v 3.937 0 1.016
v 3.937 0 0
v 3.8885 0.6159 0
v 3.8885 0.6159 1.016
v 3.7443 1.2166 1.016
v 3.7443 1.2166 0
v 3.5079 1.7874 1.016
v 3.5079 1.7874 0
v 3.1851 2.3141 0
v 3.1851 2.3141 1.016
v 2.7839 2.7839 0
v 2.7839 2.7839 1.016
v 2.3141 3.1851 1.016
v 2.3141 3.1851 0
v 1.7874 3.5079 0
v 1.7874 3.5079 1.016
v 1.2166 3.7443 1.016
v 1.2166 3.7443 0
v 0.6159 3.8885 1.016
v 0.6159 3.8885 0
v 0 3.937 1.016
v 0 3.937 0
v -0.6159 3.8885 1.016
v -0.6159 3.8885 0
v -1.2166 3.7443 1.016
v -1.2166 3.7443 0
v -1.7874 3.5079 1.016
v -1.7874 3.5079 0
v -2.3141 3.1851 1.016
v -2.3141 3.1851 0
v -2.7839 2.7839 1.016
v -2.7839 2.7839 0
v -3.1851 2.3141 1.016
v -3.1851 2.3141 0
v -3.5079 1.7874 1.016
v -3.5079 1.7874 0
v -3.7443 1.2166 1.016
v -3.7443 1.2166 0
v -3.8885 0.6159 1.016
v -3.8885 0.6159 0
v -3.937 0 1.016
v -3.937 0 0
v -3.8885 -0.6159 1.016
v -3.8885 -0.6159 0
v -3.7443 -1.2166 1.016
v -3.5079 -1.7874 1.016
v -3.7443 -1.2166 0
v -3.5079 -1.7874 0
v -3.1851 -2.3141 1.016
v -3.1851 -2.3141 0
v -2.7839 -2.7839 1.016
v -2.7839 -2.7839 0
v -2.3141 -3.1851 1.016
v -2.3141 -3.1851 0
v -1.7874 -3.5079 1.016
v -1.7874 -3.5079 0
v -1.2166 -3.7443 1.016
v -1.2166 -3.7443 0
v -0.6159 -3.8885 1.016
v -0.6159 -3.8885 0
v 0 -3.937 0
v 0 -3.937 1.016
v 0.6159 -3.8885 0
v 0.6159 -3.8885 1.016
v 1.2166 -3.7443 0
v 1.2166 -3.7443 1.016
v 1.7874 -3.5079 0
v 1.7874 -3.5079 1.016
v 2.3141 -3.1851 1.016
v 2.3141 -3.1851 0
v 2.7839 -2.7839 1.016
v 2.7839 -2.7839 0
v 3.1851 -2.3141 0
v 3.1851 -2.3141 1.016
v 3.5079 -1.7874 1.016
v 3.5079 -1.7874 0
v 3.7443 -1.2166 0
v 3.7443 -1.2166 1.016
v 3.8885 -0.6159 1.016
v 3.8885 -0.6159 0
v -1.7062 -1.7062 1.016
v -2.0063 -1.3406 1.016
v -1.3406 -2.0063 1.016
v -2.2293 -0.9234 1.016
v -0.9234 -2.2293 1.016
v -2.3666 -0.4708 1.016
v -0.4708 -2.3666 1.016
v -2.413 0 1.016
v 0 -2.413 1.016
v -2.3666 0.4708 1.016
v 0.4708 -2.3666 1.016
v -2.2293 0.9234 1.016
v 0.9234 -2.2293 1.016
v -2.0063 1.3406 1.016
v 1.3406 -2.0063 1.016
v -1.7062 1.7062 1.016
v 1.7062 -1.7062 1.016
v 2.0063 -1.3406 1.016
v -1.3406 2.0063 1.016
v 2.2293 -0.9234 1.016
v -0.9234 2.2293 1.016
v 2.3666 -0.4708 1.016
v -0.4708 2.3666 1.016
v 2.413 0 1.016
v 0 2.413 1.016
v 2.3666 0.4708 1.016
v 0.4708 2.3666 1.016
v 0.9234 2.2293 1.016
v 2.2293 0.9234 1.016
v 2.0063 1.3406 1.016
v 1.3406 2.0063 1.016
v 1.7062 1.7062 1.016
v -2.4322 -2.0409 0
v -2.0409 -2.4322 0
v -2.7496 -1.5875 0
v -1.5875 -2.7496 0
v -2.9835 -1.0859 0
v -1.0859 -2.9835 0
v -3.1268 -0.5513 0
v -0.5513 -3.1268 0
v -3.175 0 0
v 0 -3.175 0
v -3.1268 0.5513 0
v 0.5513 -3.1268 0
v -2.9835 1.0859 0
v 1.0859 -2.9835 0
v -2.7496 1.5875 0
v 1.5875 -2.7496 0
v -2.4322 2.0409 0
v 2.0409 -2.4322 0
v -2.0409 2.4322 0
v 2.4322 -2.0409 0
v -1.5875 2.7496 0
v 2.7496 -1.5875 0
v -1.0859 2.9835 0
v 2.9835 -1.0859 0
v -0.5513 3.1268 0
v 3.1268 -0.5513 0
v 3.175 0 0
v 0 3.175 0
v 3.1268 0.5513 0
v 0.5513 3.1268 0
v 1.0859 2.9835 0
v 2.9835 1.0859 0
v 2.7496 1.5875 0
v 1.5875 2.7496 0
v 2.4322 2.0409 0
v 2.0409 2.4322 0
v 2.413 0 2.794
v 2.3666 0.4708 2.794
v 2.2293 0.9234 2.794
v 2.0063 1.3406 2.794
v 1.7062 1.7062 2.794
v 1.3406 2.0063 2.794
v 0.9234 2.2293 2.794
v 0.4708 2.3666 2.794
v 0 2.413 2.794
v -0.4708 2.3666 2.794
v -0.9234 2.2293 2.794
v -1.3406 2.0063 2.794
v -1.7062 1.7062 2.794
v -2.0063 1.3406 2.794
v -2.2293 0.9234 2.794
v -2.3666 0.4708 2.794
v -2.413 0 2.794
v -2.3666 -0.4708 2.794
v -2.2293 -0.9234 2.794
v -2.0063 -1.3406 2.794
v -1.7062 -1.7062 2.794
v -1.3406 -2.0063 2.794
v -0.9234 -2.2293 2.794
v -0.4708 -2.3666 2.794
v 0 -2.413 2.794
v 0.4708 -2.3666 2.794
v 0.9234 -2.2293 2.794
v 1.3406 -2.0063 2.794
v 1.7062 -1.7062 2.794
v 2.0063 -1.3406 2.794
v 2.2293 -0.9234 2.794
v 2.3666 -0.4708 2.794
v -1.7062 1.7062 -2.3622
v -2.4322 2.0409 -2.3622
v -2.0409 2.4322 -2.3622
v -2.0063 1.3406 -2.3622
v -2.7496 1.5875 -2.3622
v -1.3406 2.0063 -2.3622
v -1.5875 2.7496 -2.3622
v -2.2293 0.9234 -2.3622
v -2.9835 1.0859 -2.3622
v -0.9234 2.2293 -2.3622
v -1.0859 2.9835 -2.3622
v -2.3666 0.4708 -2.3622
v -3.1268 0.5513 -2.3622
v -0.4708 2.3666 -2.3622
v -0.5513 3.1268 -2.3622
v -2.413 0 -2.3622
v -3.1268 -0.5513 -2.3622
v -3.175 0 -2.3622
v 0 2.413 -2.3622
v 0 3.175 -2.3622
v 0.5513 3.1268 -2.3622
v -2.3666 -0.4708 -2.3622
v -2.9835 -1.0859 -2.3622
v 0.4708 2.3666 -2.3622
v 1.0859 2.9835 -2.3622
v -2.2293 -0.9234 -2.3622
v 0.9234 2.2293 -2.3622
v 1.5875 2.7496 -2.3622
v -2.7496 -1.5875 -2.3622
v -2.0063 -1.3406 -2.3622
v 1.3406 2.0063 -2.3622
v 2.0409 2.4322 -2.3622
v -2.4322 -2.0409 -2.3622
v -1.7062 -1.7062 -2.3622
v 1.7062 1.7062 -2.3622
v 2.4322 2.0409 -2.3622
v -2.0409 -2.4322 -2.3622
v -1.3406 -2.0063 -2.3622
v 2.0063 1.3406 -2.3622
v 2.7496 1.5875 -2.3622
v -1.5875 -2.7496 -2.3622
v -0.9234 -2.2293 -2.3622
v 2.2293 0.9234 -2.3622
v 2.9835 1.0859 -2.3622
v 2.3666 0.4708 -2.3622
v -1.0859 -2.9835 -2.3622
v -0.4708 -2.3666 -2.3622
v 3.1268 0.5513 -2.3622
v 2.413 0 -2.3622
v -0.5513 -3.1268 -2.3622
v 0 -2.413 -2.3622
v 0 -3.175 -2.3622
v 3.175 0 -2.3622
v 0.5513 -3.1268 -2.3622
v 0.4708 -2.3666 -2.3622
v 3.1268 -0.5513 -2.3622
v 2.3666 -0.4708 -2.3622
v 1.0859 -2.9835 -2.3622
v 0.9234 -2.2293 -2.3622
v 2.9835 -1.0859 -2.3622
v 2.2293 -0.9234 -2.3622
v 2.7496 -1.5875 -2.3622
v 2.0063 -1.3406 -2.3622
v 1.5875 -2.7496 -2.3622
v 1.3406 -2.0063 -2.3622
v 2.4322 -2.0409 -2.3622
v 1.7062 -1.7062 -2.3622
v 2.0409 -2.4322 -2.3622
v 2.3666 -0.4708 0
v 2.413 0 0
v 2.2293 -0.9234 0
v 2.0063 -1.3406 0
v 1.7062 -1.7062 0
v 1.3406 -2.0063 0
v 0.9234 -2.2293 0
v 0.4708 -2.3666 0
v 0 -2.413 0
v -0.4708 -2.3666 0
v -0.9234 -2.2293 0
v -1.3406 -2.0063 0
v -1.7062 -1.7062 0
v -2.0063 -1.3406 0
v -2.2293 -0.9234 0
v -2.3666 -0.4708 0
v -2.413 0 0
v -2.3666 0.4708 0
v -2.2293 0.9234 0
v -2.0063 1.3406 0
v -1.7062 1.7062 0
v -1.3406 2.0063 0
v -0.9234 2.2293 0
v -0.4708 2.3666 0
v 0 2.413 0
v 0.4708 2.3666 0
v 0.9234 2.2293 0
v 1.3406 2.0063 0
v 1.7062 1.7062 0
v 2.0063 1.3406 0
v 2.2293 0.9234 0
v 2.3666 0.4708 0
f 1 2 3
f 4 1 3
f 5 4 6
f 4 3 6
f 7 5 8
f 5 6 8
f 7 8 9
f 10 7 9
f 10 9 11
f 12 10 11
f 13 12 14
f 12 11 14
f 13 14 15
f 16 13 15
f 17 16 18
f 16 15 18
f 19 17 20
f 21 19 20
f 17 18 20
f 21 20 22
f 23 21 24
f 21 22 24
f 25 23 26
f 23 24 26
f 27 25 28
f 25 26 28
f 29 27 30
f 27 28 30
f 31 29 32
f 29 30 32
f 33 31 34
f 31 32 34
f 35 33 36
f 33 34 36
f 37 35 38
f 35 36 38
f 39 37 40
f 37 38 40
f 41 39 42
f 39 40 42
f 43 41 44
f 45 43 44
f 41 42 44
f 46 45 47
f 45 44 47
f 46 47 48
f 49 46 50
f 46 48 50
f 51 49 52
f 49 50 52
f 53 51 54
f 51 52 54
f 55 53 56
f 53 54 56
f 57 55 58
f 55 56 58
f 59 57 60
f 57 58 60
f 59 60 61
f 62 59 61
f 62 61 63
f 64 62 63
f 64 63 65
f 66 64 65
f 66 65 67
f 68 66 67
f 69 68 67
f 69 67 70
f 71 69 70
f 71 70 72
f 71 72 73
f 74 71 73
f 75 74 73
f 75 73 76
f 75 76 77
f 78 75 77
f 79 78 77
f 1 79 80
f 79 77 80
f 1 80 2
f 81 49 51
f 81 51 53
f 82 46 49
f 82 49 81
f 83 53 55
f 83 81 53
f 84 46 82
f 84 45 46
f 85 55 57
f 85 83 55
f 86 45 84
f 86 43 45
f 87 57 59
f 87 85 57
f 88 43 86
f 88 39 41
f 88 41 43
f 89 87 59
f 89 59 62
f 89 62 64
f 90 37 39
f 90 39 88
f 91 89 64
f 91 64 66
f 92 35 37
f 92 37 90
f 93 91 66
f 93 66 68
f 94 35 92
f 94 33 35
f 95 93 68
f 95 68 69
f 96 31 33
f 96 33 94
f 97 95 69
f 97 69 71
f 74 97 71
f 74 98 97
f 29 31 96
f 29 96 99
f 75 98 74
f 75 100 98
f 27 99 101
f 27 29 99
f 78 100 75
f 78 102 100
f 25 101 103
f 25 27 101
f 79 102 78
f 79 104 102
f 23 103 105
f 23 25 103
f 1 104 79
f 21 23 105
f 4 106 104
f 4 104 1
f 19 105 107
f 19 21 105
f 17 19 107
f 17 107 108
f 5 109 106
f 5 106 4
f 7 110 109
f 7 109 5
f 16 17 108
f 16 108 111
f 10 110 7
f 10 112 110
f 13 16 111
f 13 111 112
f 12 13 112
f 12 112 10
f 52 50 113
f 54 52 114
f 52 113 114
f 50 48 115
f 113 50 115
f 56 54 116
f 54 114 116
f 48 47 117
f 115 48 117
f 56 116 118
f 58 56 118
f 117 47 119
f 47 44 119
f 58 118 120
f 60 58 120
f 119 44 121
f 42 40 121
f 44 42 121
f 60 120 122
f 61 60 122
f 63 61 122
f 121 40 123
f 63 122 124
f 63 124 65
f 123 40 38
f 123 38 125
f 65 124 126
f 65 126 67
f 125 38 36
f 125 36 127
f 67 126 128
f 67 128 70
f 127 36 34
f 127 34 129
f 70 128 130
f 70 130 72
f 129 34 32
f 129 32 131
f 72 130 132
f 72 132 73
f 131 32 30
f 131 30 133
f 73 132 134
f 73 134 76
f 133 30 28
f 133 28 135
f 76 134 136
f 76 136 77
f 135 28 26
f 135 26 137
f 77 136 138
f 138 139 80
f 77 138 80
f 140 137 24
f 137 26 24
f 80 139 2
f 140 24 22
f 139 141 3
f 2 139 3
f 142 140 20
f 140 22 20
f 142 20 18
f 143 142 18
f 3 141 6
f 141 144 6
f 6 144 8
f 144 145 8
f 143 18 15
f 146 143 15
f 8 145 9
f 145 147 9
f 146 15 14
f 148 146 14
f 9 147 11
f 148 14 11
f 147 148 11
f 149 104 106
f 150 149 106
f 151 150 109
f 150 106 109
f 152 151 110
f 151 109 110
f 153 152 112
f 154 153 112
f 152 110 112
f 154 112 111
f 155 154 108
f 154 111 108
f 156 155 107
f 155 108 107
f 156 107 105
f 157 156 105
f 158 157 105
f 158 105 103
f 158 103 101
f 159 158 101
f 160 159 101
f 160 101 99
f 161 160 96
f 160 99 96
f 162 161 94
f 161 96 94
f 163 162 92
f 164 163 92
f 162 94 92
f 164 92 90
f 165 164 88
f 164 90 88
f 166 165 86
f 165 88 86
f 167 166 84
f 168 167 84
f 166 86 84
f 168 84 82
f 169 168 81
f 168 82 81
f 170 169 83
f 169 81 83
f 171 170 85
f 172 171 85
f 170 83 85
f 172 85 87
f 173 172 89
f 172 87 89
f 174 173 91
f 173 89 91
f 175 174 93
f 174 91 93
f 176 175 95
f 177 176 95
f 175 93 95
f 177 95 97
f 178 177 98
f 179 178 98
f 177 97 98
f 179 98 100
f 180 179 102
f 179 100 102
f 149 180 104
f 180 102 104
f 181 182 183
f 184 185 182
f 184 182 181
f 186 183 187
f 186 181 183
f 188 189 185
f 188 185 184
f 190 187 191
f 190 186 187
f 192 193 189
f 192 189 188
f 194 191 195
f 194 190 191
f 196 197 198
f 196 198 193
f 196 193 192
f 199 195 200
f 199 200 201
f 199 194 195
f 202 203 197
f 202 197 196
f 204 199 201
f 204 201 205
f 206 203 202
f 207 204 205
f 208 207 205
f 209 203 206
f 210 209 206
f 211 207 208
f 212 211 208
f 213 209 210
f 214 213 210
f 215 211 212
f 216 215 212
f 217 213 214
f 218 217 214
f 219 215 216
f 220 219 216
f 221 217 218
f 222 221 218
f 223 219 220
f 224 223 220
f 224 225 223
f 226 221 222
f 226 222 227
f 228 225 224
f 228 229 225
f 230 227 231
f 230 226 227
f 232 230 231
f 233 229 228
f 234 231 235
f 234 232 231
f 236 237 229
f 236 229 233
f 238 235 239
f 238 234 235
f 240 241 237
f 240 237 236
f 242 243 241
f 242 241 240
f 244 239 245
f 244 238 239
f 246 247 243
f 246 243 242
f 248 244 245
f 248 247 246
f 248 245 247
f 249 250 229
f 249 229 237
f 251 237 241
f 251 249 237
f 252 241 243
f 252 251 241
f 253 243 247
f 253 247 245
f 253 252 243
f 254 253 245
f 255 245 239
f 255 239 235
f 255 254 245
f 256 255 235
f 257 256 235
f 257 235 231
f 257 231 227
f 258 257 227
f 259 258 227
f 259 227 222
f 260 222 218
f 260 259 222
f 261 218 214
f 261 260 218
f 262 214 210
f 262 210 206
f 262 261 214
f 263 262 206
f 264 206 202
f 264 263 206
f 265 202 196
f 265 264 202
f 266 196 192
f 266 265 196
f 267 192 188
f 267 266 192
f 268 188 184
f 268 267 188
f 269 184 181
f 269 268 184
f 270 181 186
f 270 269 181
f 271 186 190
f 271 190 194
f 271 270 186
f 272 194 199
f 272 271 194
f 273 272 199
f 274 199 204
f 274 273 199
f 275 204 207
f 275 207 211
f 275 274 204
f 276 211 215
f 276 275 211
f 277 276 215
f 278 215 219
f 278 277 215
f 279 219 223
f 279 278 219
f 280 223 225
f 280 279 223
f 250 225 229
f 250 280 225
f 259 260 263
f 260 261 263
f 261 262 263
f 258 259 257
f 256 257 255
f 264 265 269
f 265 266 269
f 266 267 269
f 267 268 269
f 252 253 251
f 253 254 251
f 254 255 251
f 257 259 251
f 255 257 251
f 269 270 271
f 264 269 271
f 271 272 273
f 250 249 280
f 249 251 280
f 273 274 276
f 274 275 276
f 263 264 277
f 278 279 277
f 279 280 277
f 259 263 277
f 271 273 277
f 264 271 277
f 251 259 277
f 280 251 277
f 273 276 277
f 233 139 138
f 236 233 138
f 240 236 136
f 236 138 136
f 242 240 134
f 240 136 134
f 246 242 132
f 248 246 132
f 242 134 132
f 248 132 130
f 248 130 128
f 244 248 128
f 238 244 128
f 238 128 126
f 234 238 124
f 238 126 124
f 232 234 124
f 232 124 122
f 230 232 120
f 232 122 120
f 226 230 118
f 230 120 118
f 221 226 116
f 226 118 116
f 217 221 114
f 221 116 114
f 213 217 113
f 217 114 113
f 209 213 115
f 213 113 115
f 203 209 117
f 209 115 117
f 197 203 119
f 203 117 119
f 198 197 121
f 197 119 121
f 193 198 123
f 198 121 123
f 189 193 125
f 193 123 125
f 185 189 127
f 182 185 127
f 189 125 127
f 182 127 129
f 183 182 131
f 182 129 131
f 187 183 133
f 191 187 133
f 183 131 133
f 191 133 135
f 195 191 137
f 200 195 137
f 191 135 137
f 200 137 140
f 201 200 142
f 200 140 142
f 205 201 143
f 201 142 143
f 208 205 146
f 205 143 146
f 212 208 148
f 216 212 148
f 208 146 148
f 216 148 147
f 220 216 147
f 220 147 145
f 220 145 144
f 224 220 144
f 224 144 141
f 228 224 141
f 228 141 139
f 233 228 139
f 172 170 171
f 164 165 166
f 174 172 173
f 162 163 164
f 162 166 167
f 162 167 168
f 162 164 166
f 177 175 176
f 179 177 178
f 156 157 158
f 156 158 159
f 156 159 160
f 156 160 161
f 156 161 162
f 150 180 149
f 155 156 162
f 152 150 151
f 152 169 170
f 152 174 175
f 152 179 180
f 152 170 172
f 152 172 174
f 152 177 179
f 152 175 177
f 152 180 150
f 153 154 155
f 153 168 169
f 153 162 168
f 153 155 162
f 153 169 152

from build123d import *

# Parameters (mm, degrees)
F0_R     = 3.937
F1_DEPTH = 1.016
F2_R     = 2.413
F3_DEPTH = 1.778
F4_R     = 3.175
F4_R_2   = 2.413
F5_DEPTH = 2.3622


with BuildPart() as f1:
    # F0 (on Top) → F1 (new body)
    with BuildSketch(Plane.XY):
        Circle(F0_R)
    extrude(amount=F1_DEPTH)

    # F2 (on face) → F3 (join)
    with BuildSketch(Plane.XY.offset(1.016)):
        Circle(F2_R)
    extrude(amount=F3_DEPTH)

    # F4 (on face) → F5 (join)
    with BuildSketch(Plane(origin=(0, 0, 0), x_dir=(1, 0, 0), z_dir=(0, 0, -1))):
        Circle(F4_R)
        Circle(F4_R_2, mode=Mode.SUBTRACT)
    extrude(amount=F5_DEPTH)


solid = f1.part
